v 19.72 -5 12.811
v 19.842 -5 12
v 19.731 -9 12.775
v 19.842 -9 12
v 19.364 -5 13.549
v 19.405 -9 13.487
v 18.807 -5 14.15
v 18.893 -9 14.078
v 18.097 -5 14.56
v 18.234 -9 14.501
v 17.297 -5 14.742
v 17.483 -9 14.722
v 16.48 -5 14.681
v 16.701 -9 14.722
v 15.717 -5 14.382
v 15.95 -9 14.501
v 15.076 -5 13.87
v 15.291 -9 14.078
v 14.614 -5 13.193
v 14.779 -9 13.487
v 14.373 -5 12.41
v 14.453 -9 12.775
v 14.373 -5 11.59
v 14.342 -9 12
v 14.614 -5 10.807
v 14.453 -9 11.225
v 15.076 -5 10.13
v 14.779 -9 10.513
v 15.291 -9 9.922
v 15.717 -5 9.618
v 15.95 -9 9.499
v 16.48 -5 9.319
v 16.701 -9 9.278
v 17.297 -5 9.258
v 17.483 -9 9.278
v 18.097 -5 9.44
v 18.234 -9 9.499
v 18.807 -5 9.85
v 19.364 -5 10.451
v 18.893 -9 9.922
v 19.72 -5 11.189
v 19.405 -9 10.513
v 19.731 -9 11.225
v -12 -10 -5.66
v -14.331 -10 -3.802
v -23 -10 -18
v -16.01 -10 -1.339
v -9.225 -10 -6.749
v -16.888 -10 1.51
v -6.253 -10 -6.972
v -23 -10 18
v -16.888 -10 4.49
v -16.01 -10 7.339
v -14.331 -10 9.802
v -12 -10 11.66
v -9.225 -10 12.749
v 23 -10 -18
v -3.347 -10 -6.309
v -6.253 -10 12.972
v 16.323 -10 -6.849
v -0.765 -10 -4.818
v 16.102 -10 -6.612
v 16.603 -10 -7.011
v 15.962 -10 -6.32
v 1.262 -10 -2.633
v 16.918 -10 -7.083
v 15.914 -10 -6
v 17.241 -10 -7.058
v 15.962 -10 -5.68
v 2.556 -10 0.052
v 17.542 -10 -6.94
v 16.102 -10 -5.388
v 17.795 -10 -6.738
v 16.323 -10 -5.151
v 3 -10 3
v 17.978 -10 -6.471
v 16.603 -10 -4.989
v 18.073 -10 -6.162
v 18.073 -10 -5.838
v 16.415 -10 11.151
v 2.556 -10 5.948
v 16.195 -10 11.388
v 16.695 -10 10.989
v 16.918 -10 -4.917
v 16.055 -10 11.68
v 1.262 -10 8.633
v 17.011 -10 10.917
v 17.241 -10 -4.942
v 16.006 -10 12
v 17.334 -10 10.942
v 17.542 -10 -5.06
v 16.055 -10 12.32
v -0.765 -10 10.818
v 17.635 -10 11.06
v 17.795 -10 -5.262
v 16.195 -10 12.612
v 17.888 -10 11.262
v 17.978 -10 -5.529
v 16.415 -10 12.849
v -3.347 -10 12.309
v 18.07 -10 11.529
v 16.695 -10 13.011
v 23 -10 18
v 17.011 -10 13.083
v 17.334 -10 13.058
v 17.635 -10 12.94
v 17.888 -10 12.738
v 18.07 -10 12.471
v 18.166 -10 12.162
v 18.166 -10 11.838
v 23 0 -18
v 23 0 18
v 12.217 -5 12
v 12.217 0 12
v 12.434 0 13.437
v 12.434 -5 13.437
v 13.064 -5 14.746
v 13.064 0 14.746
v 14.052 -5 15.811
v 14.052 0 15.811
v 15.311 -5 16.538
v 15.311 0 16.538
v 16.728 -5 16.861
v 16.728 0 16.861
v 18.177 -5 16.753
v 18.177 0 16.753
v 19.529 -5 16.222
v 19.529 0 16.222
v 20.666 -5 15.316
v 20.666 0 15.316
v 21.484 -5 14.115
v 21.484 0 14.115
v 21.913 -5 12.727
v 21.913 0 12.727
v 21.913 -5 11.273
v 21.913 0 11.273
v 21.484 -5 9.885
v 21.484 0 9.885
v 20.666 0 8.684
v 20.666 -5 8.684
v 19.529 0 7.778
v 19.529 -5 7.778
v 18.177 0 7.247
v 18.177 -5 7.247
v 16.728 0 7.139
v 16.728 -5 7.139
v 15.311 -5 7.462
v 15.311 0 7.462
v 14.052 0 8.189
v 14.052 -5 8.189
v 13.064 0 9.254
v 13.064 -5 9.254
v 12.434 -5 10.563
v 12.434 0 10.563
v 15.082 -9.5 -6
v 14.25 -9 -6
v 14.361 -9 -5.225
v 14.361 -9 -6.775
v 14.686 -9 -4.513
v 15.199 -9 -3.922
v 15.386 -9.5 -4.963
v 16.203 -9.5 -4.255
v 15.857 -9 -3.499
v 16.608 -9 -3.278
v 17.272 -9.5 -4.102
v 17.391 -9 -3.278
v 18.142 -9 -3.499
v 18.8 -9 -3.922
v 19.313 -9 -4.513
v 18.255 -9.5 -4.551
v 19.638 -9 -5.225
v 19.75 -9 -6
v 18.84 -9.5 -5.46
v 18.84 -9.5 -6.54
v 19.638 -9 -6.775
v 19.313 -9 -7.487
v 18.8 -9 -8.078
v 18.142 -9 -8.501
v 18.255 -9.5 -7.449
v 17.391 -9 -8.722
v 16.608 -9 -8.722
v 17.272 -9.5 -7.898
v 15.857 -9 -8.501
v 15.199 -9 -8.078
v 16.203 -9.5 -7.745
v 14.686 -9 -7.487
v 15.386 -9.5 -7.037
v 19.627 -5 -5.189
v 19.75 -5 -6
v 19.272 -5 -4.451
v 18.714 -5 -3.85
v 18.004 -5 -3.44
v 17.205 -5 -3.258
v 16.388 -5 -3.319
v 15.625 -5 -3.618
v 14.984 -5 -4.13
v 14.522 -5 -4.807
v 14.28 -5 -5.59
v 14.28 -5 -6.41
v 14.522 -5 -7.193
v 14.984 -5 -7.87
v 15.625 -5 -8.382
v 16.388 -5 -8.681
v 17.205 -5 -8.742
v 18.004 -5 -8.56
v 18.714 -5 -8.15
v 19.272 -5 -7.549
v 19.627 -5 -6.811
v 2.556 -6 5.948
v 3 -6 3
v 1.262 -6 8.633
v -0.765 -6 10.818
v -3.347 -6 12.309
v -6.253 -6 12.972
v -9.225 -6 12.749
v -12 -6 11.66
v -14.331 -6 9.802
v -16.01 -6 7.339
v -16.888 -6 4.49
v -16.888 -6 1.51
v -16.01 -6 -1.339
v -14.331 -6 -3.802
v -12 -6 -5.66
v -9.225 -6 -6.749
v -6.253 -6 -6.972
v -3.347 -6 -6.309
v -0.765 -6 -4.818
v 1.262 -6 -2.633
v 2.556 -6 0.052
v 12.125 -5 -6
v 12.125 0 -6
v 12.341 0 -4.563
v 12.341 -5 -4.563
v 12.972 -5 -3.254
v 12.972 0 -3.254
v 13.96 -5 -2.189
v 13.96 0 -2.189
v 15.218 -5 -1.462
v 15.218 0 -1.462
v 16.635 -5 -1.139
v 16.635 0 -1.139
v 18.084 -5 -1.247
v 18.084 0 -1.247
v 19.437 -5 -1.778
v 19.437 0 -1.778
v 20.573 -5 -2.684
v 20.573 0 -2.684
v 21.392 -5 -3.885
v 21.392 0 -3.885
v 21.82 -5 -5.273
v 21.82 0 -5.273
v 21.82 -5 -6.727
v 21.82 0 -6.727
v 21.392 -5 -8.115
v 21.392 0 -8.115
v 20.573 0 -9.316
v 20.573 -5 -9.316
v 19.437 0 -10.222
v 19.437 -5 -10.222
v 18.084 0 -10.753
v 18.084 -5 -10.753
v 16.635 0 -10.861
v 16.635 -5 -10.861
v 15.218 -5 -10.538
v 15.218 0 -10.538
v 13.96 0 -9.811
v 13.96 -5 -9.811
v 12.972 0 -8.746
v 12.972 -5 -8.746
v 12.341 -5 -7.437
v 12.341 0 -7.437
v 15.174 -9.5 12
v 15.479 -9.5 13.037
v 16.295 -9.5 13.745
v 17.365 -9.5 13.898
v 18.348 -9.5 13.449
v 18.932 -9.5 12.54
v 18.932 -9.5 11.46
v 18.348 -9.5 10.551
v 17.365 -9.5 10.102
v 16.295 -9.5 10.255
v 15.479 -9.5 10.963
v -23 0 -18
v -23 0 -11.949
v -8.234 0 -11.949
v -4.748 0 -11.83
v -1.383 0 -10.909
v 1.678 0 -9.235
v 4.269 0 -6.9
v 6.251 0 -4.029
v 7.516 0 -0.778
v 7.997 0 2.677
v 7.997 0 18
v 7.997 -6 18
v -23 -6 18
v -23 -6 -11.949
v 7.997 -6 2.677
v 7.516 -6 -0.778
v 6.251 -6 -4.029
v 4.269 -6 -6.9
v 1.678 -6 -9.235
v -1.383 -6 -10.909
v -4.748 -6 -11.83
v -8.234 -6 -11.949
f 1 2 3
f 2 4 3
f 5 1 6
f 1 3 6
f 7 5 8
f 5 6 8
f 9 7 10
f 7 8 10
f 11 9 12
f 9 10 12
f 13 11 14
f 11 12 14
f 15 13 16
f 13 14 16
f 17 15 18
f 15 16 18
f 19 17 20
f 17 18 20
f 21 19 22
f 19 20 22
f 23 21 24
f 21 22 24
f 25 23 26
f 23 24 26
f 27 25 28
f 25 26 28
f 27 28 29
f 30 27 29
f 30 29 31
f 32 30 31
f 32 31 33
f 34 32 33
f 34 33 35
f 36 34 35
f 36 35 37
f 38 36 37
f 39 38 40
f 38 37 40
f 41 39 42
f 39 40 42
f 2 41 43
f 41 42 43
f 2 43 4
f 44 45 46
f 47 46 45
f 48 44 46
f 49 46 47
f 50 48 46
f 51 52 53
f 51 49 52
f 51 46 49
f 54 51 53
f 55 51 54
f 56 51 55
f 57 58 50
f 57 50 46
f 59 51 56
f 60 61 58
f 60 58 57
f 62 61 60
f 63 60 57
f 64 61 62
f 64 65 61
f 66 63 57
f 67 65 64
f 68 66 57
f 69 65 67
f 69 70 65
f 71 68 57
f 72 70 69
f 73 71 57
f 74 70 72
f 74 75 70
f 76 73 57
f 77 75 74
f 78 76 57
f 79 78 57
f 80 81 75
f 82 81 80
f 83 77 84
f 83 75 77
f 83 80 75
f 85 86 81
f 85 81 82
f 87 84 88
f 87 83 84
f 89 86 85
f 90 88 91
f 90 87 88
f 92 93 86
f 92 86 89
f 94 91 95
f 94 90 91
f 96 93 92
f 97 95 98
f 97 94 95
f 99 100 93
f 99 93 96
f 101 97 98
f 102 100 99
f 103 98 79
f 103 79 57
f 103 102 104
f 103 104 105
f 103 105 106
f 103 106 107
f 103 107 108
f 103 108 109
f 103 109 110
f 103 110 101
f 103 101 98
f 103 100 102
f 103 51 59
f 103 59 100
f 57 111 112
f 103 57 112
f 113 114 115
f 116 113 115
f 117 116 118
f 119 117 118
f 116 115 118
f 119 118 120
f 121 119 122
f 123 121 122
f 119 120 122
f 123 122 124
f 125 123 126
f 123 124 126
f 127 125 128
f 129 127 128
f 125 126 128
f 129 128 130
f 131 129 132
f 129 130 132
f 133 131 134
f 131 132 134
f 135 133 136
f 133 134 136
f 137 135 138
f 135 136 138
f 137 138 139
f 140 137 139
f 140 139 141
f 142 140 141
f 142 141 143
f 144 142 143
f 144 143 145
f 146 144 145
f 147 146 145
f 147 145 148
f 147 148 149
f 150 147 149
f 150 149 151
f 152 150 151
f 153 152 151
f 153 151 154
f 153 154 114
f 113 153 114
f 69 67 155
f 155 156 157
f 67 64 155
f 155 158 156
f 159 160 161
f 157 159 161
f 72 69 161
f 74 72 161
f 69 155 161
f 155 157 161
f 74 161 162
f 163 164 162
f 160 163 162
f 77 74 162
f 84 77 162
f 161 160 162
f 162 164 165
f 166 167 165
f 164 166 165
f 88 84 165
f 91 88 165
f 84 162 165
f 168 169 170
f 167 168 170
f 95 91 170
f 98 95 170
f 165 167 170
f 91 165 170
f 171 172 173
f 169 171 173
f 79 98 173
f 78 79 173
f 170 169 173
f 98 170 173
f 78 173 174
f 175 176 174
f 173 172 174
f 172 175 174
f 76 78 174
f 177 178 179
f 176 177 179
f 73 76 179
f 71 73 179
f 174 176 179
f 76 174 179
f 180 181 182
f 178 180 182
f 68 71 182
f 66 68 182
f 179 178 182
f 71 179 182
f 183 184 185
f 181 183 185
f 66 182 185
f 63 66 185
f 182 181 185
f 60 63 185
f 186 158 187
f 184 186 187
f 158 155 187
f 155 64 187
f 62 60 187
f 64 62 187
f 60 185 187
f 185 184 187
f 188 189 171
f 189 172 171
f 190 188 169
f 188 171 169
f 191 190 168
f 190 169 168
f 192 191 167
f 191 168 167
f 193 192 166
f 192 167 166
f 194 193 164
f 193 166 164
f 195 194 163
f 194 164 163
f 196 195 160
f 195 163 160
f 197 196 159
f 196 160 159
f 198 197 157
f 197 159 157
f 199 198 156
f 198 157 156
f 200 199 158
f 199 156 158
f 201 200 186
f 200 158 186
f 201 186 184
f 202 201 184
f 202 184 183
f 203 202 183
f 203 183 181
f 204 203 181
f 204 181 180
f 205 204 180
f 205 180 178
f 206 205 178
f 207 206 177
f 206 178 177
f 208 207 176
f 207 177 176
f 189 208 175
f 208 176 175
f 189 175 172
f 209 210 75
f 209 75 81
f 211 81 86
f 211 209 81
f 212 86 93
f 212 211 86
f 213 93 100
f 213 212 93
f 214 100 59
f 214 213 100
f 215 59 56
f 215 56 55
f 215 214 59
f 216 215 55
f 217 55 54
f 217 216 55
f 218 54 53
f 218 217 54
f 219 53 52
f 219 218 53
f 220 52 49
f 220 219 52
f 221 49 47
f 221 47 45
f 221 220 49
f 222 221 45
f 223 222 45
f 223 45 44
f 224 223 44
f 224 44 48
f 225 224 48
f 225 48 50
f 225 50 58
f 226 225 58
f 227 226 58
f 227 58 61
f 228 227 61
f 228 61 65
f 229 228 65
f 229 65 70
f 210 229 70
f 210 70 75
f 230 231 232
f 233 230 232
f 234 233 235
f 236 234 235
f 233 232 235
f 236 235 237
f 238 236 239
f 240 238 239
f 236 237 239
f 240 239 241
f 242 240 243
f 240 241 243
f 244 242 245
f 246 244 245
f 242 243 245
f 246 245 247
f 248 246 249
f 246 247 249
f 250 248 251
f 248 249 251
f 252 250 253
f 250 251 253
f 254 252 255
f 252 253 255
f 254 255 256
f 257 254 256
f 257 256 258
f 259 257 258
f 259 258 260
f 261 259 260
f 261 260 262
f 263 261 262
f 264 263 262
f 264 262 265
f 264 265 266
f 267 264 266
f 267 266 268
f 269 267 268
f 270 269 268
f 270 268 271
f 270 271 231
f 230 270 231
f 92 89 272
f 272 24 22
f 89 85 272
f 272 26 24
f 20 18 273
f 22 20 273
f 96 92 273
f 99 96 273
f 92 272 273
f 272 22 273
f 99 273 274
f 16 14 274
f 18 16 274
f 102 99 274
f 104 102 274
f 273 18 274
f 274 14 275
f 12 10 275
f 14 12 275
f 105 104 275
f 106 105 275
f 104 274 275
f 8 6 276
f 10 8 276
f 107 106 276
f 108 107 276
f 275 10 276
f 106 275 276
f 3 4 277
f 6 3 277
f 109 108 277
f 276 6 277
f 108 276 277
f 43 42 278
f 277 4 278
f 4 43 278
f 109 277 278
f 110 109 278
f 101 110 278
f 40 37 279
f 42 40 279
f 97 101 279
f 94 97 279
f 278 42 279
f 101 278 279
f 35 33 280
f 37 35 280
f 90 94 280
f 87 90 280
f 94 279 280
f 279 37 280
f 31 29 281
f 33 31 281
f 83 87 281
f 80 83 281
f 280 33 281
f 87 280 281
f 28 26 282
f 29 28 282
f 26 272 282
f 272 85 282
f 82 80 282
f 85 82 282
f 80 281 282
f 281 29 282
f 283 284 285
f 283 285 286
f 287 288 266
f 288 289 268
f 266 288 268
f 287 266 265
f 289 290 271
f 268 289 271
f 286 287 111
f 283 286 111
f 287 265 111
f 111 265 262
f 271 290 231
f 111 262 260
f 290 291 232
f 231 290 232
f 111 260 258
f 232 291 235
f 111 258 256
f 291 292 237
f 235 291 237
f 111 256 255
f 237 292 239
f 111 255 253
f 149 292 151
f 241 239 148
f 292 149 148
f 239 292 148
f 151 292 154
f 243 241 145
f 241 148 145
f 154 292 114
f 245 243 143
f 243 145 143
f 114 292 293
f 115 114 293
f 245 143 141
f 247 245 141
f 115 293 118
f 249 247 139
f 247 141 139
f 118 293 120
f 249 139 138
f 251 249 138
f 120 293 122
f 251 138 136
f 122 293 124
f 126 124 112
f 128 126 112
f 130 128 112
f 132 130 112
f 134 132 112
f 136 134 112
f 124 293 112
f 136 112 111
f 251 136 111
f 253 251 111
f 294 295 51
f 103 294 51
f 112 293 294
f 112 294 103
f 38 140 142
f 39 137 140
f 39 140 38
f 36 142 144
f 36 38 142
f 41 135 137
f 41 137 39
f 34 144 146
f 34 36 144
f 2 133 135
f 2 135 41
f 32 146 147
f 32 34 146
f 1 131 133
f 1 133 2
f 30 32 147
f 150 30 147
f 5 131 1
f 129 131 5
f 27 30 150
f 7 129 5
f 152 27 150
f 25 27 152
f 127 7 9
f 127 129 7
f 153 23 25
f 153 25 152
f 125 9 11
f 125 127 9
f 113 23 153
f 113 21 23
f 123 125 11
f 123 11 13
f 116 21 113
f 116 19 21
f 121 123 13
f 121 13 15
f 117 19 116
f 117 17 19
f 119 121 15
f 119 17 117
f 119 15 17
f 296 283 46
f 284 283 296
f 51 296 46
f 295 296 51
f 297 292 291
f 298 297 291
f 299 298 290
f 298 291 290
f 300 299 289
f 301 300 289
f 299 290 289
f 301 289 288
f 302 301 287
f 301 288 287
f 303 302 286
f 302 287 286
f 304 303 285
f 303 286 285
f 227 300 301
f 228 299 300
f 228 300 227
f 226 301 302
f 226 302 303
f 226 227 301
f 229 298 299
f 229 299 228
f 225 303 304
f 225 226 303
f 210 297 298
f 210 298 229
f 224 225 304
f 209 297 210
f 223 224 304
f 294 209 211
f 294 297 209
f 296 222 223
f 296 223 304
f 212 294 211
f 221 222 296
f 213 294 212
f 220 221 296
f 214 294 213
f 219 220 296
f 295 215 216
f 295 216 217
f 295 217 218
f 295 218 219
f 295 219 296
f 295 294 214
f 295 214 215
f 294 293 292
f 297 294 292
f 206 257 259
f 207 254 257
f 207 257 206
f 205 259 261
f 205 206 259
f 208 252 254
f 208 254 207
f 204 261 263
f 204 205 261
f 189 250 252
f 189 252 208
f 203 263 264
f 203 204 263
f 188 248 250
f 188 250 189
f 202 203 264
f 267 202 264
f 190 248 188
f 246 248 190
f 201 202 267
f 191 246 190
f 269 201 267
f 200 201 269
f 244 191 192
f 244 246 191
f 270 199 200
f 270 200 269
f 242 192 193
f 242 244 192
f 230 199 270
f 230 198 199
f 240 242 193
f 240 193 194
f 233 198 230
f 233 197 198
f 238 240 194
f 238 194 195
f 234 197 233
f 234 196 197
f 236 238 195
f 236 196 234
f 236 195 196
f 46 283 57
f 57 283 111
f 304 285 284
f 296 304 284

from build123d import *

# Parameters (mm, degrees)
F0_W           = 46
F0_H           = 36
F0_R           = 10
F1_DEPTH       = 10
F3_D           = 5.5
F3_DEPTH       = 9
F3_CBORE_D     = 9.75
F3_CBORE_DEPTH = 5
F3_TIP         = 1.6523667023
F4_R           = 10
F5_DEPTH       = 6


with BuildPart() as f1:
    # F0 (on Front) → F1 (new body)
    with BuildSketch(Plane.XZ):
        Rectangle(F0_W, F0_H)
        with Locations((-7, 3)):
            Circle(F0_R, mode=Mode.SUBTRACT)
    extrude(amount=F1_DEPTH)

    # F3
    with Locations(Plane(origin=(0, 0, 0), x_dir=(-1, 0, 0), z_dir=(0, 1, 0))):
        with Locations((-17.0919913413, 12), (-16.9995214964, -6)):
            CounterBoreHole(F3_D / 2, F3_CBORE_D / 2, F3_CBORE_DEPTH, depth=F3_DEPTH)
            with Locations((0, 0, -(F3_DEPTH + F3_TIP / 2))):  # 118° drill point
                Cone(0, F3_D / 2, F3_TIP, mode=Mode.SUBTRACT)

    # F4 (on face) → F5 (cut)
    with BuildSketch(Plane(origin=(0, 0, 0), x_dir=(-1, 0, 0), z_dir=(0, 1, 0))):
        with BuildLine():
            Line((-7.9965220779, 18), (-7.9965220779, 3.3229946864))
            Line((-7.9965220779, 3.3229946864), (-7.9965220779, 2.6770053136))
            ThreePointArc((-7.9965220779, 2.6770053136), (-3.0413947673, -8.1431768867), (8.2344393019, -11.9491190245))
            Line((8.2344393019, -11.9491190245), (23, -11.9491190245))
            Line((23, -11.9491190245), (23, 18))
            Line((23, 18), (-7.9965220779, 18))
        make_face()
        with Locations((7, 3)):
            Circle(F4_R, mode=Mode.SUBTRACT)
    extrude(amount=-F5_DEPTH, mode=Mode.SUBTRACT)


solid = f1.part
